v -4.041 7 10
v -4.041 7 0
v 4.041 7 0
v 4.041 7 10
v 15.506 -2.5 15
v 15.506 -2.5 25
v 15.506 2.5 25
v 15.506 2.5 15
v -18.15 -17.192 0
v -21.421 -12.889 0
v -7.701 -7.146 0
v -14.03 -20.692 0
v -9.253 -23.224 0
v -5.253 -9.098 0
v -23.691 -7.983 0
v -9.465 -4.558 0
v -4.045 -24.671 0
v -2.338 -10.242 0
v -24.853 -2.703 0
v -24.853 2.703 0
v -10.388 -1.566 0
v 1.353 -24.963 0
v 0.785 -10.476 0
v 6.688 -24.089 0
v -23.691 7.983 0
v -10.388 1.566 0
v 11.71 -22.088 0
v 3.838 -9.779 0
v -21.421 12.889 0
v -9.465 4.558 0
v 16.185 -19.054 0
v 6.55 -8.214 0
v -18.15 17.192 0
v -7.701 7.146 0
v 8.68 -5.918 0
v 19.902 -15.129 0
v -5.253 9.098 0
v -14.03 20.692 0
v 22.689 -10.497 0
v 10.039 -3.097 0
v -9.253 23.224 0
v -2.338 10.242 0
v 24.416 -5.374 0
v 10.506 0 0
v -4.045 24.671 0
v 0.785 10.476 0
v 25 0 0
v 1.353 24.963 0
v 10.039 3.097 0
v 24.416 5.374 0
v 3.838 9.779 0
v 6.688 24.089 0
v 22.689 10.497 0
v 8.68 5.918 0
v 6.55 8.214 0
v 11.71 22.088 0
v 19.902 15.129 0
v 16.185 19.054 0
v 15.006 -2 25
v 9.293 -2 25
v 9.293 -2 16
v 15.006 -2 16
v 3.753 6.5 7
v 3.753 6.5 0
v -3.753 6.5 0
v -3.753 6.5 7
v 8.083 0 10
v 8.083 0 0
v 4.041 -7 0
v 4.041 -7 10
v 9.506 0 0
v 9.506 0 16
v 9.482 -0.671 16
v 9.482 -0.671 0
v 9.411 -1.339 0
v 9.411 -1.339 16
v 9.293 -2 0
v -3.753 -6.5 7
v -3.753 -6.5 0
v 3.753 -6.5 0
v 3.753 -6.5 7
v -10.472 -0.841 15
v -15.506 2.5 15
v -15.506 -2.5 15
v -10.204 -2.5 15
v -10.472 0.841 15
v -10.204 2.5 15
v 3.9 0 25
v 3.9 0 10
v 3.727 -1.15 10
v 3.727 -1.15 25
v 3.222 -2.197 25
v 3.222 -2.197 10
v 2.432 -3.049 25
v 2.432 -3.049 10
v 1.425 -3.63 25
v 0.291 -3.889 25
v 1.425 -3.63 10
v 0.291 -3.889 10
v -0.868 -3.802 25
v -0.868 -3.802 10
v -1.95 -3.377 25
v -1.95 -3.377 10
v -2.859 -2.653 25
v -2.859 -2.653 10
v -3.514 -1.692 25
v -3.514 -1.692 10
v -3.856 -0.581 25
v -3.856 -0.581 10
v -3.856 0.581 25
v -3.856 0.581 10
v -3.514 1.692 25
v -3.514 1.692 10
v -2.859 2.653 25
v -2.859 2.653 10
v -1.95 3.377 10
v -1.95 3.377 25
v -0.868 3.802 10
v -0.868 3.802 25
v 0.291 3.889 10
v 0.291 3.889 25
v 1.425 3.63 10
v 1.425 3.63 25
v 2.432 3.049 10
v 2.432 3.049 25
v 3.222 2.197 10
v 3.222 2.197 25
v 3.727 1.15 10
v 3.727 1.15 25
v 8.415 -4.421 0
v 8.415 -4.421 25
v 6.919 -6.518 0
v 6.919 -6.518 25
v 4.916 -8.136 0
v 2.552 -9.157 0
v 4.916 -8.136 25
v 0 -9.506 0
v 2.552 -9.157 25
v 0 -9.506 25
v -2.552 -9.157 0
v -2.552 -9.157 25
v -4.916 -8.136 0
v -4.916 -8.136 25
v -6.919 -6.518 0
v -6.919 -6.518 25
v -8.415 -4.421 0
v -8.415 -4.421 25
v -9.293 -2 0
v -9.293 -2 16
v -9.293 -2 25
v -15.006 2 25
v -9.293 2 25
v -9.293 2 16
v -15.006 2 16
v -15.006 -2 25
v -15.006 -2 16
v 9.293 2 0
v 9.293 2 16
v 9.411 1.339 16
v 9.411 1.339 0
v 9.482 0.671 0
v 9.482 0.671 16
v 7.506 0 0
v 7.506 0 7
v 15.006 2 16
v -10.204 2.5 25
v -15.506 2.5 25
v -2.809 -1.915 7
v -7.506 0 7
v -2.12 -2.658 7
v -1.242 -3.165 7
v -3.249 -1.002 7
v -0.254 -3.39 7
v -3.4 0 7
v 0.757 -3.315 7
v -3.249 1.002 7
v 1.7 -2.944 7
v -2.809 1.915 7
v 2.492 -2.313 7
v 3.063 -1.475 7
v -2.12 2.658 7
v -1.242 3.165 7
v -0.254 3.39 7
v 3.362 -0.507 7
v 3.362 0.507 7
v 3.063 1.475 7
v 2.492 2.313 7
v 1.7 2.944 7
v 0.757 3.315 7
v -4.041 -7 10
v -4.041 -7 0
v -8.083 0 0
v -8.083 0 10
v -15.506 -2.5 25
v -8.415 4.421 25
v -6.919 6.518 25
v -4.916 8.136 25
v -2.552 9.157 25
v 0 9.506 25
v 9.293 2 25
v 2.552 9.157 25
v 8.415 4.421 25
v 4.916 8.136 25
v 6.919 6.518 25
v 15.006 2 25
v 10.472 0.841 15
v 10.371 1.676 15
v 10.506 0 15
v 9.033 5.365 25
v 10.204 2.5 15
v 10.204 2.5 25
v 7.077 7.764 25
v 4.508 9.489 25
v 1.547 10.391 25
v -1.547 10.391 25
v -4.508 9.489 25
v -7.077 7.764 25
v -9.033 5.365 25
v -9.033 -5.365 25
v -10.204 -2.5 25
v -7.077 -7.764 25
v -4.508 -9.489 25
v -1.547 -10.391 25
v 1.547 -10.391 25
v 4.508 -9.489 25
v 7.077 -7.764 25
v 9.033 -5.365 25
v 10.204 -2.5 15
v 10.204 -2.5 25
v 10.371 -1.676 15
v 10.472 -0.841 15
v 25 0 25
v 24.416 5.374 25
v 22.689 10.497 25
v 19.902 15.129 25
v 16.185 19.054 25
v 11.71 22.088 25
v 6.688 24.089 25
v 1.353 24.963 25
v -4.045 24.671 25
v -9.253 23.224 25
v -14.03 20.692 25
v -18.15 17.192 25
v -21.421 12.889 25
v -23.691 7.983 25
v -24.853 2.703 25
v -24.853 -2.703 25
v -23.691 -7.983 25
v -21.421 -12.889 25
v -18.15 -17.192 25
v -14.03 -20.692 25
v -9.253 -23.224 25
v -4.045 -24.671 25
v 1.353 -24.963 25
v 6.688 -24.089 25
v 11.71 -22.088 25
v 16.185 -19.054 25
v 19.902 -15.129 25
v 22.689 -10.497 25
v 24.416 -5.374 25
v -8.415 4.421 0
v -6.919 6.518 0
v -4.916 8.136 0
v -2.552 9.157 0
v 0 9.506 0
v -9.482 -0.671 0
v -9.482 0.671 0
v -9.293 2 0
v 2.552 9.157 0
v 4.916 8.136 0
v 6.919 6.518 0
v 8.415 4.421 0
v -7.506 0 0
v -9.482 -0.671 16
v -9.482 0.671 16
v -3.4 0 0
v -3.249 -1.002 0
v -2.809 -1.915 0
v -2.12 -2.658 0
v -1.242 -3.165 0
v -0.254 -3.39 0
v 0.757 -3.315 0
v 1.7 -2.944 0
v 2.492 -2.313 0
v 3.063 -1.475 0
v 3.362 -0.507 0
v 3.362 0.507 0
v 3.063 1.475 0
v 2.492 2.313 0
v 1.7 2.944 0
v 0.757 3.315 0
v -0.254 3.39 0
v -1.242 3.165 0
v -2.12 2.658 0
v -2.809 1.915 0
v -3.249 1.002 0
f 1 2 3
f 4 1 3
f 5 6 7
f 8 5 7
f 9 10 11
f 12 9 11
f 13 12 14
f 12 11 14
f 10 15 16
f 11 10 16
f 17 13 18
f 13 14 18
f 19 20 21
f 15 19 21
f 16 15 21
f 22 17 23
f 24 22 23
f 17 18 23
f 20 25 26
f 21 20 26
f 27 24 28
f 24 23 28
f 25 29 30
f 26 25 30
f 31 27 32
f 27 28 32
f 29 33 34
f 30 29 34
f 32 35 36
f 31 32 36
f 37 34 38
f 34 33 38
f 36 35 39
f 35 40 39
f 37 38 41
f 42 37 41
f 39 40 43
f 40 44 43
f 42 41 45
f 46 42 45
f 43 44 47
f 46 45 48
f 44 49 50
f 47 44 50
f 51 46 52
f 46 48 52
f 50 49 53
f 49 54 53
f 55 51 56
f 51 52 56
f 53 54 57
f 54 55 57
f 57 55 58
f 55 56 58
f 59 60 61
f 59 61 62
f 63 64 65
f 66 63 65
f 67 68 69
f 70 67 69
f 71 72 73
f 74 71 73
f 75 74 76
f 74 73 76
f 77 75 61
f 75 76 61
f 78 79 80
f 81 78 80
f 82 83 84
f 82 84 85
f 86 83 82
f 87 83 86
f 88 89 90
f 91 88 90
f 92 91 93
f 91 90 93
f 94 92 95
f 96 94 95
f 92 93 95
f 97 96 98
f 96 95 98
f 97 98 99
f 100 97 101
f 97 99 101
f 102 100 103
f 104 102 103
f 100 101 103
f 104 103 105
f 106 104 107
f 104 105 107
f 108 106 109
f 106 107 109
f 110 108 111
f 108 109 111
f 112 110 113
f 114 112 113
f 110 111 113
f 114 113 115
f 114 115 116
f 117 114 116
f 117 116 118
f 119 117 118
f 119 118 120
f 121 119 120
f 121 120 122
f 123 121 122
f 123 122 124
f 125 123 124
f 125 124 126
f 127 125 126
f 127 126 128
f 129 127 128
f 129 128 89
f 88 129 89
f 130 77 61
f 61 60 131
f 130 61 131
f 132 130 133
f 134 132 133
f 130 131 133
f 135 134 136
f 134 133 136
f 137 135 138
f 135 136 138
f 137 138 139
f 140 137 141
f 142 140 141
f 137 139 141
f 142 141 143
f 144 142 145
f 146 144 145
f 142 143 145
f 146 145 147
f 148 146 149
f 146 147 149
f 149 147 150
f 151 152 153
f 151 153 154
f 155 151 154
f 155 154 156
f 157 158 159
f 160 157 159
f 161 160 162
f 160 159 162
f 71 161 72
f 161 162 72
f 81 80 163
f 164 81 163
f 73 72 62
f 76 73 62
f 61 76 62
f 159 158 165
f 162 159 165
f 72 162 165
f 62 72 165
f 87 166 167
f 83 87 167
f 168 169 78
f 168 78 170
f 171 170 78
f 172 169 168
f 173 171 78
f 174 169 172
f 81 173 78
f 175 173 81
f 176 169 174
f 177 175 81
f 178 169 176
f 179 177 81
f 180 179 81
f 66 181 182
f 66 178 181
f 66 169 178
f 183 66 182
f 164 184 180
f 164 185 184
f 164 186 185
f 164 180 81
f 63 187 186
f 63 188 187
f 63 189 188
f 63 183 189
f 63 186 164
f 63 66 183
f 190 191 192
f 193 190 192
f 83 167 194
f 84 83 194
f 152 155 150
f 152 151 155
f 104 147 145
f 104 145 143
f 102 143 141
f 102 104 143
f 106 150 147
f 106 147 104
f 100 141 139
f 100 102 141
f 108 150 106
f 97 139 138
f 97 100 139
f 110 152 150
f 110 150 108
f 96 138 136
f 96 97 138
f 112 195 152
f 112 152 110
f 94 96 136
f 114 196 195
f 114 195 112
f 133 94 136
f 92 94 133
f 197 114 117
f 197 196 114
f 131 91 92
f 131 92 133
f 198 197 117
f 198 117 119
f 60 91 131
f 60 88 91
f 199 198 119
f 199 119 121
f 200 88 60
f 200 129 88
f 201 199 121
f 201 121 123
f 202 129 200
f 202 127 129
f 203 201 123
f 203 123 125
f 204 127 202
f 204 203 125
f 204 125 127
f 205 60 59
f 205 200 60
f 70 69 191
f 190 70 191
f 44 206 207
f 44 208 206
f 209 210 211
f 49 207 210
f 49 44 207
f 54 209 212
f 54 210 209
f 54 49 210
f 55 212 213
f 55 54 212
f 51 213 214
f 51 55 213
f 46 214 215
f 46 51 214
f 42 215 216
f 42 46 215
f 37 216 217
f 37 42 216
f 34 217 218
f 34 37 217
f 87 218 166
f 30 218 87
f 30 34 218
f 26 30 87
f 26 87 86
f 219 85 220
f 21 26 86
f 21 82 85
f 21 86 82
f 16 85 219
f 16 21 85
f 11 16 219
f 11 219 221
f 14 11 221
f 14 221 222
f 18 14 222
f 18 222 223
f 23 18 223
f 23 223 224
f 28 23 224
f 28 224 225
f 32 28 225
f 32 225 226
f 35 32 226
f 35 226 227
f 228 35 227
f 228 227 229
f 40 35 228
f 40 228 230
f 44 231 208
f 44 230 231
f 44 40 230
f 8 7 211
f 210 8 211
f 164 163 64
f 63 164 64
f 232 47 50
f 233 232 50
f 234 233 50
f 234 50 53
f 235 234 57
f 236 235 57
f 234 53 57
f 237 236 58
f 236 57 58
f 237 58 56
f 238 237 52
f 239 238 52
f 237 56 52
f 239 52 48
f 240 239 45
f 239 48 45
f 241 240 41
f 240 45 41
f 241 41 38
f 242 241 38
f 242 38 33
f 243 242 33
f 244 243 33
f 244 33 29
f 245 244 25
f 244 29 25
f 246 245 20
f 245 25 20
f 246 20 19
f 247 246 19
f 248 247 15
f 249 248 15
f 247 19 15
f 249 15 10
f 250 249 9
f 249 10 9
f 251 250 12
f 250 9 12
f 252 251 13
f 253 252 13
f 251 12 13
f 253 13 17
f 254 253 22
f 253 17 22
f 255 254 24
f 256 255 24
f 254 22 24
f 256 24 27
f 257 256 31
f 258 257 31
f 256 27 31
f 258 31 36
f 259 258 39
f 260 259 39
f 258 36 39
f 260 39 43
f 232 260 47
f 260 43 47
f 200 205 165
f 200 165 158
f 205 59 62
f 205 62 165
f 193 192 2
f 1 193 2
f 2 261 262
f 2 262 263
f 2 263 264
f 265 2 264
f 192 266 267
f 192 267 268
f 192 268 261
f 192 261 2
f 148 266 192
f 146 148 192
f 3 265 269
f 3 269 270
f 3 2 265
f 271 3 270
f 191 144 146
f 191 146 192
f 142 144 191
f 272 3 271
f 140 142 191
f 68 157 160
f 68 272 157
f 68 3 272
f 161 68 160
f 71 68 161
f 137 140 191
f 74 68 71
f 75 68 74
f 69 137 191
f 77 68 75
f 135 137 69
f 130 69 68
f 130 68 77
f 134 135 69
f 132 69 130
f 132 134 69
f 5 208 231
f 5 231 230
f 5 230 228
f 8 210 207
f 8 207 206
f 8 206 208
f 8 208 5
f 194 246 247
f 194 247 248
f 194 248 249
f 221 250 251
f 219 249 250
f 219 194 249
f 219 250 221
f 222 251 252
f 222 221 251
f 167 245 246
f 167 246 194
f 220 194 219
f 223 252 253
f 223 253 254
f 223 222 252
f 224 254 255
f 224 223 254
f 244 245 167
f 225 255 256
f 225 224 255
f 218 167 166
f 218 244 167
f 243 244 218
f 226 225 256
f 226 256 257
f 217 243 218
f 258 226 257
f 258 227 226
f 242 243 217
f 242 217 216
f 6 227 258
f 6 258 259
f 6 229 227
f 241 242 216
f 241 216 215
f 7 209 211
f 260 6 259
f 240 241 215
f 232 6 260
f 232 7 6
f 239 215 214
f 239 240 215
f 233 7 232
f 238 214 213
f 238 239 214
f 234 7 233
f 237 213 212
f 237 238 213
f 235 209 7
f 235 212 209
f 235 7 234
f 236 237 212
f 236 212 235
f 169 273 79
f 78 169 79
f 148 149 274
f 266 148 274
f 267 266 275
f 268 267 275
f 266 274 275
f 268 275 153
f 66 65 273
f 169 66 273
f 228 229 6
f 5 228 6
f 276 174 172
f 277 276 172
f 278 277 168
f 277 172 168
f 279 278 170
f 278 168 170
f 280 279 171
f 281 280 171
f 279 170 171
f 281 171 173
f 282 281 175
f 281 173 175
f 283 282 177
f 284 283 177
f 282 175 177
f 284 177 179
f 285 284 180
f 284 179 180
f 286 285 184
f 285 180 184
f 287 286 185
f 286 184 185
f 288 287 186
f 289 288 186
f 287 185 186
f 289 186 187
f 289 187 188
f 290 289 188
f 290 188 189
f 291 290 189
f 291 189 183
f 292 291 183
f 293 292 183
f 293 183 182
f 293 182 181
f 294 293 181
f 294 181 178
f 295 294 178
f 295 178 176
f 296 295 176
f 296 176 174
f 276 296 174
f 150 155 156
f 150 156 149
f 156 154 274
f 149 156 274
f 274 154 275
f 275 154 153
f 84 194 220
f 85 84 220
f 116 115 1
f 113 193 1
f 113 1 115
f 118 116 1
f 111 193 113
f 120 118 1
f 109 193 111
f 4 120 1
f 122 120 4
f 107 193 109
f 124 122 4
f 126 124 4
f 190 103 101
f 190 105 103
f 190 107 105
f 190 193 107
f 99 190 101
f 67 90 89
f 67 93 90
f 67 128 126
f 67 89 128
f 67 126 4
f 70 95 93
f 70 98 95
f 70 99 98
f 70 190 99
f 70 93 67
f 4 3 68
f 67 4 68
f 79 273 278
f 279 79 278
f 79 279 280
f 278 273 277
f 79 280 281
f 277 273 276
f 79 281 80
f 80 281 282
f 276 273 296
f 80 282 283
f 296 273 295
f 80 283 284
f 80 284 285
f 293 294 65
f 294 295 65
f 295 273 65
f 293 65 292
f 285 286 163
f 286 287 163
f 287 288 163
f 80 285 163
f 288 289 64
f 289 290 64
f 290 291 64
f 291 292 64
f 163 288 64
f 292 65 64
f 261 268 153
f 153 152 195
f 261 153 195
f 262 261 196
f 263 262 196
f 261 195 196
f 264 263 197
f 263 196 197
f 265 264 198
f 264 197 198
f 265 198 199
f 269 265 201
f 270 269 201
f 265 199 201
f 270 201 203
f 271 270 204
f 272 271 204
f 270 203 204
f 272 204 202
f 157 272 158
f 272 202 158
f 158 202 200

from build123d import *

# Parameters (mm, degrees)
F0_R      = 25
F0_R_2    = 10.5055534995
F1_DEPTH  = 25
F2_DEPTH  = 7
F3_D      = 6.8
F3_DEPTH  = 12.25
F3_TIP    = 2.0429261047
F5_DEPTH  = 10
F7_DEPTH  = 9
F9_DEPTH  = 16
F10_R     = 3.9
F11_DEPTH = 10
F12_DEPTH = 25


with BuildPart() as f1:
    # F0 (on Top) → F1 (new body)
    with BuildSketch(Plane.XY):
        Circle(F0_R)
        Circle(F0_R_2, mode=Mode.SUBTRACT)
    extrude(amount=F1_DEPTH)

    # F4 (on face) → F5 (cut)
    with BuildSketch(Plane.XY.offset(25)):
        with BuildLine():
            Line((-10.2037568733, 2.5), (-15.5055534995, 2.5))
            Line((-15.5055534995, 2.5), (-15.5055534995, -2.5))
            Line((-15.5055534995, -2.5), (-10.2037568733, -2.5))
            ThreePointArc((-10.2037568733, -2.5), (-10.5055534995, 0), (-10.2037568733, 2.5))
        make_face()
        with BuildLine():
            Line((15.5055534995, 2.5), (10.2037568733, 2.5))
            ThreePointArc((10.2037568733, 2.5), (10.4298314478, 1.2590751768), (10.5055534995, 0))
            ThreePointArc((10.5055534995, 0), (10.4298314478, -1.2590751768), (10.2037568733, -2.5))
            Line((10.2037568733, -2.5), (15.5055534995, -2.5))
            Line((15.5055534995, -2.5), (15.5055534995, 2.5))
        make_face()
    extrude(amount=-F5_DEPTH, mode=Mode.SUBTRACT)


with BuildPart() as f2:
    # F0 (on Top) → F2 (new body)
    with BuildSketch(Plane.XY):
        Polygon((3.7527767497, 6.5), (-3.7527767497, 6.5), (-7.5055534995, 0), (-3.7527767497, -6.5), (3.7527767497, -6.5), (7.5055534995, 0), align=None)
    extrude(amount=F2_DEPTH)

    # F3
    with Locations(Plane(origin=(0, 0, 0), x_dir=(1, 0, 0), z_dir=(0, 0, -1))):
        with Locations((0, 0)):
            Hole(F3_D / 2, depth=F3_DEPTH)
            with Locations((0, 0, -(F3_DEPTH + F3_TIP / 2))):  # 118° drill point
                Cone(0, F3_D / 2, F3_TIP, mode=Mode.SUBTRACT)


with BuildPart() as f7:
    # F6 (on face) → F7 (new body, through all)
    with BuildSketch(Plane.XY.offset(25)):
        with BuildLine():
            Line((-15.0055534995, -2), (-9.2927685504, -2))
            ThreePointArc((-9.2927685504, -2), (0, -9.5055534995), (9.2927685504, -2))
            Line((9.2927685504, -2), (15.0055534995, -2))
            Line((15.0055534995, -2), (15.0055534995, 2))
            Line((15.0055534995, 2), (9.2927685504, 2))
            ThreePointArc((9.2927685504, 2), (0, 9.5055534995), (-9.2927685504, 2))
            Line((-9.2927685504, 2), (-15.0055534995, 2))
            Line((-15.0055534995, 2), (-15.0055534995, -2))
        make_face()
    extrude(amount=-F7_DEPTH)

    # F8 (on face) → F9 (join, through all)
    with BuildSketch(Plane(origin=(0, 0, 16), x_dir=(1, 0, 0), z_dir=(0, 0, -1))):
        with BuildLine():
            ThreePointArc((9.2927685504, -2), (9.4522075714, -1.0056437533), (9.5055534995, 0))
            ThreePointArc((9.5055534995, 0), (9.4522075714, 1.0056437533), (9.2927685504, 2))
            ThreePointArc((9.2927685504, 2), (0, 9.5055534995), (-9.2927685504, 2))
            ThreePointArc((-9.2927685504, 2), (-9.5055534995, 0), (-9.2927685504, -2))
            ThreePointArc((-9.2927685504, -2), (0, -9.5055534995), (9.2927685504, -2))
        make_face()
    extrude(amount=F9_DEPTH)

    # F10 (on face) → F11 (cut)
    with BuildSketch(Plane(origin=(0, 0, 0), x_dir=(1, 0, 0), z_dir=(0, 0, -1))):
        Polygon((8.0829037687, 0), (4.0414518843, 7), (-4.0414518843, 7), (-8.0829037687, 0), (-4.0414518843, -7), (4.0414518843, -7), align=None)
        Polygon((-7.5055534995, 0), (-3.7527767497, 6.5), (3.7527767497, 6.5), (7.5055534995, 0), (3.7527767497, -6.5), (-3.7527767497, -6.5), align=None, mode=Mode.SUBTRACT)
        Polygon((3.7527767497, 6.5), (-3.7527767497, 6.5), (-7.5055534995, 0), (-3.7527767497, -6.5), (3.7527767497, -6.5), (7.5055534995, 0), align=None)
        Circle(F10_R, mode=Mode.SUBTRACT)
        Circle(F10_R)
    extrude(amount=-F11_DEPTH, mode=Mode.SUBTRACT)

    # F10 (on face) → F12 (cut, through all)
    with BuildSketch(Plane(origin=(0, 0, 0), x_dir=(1, 0, 0), z_dir=(0, 0, -1))):
        Circle(F10_R)
    extrude(amount=-F12_DEPTH, mode=Mode.SUBTRACT)


solid = Compound([f1.part, f2.part, f7.part])
